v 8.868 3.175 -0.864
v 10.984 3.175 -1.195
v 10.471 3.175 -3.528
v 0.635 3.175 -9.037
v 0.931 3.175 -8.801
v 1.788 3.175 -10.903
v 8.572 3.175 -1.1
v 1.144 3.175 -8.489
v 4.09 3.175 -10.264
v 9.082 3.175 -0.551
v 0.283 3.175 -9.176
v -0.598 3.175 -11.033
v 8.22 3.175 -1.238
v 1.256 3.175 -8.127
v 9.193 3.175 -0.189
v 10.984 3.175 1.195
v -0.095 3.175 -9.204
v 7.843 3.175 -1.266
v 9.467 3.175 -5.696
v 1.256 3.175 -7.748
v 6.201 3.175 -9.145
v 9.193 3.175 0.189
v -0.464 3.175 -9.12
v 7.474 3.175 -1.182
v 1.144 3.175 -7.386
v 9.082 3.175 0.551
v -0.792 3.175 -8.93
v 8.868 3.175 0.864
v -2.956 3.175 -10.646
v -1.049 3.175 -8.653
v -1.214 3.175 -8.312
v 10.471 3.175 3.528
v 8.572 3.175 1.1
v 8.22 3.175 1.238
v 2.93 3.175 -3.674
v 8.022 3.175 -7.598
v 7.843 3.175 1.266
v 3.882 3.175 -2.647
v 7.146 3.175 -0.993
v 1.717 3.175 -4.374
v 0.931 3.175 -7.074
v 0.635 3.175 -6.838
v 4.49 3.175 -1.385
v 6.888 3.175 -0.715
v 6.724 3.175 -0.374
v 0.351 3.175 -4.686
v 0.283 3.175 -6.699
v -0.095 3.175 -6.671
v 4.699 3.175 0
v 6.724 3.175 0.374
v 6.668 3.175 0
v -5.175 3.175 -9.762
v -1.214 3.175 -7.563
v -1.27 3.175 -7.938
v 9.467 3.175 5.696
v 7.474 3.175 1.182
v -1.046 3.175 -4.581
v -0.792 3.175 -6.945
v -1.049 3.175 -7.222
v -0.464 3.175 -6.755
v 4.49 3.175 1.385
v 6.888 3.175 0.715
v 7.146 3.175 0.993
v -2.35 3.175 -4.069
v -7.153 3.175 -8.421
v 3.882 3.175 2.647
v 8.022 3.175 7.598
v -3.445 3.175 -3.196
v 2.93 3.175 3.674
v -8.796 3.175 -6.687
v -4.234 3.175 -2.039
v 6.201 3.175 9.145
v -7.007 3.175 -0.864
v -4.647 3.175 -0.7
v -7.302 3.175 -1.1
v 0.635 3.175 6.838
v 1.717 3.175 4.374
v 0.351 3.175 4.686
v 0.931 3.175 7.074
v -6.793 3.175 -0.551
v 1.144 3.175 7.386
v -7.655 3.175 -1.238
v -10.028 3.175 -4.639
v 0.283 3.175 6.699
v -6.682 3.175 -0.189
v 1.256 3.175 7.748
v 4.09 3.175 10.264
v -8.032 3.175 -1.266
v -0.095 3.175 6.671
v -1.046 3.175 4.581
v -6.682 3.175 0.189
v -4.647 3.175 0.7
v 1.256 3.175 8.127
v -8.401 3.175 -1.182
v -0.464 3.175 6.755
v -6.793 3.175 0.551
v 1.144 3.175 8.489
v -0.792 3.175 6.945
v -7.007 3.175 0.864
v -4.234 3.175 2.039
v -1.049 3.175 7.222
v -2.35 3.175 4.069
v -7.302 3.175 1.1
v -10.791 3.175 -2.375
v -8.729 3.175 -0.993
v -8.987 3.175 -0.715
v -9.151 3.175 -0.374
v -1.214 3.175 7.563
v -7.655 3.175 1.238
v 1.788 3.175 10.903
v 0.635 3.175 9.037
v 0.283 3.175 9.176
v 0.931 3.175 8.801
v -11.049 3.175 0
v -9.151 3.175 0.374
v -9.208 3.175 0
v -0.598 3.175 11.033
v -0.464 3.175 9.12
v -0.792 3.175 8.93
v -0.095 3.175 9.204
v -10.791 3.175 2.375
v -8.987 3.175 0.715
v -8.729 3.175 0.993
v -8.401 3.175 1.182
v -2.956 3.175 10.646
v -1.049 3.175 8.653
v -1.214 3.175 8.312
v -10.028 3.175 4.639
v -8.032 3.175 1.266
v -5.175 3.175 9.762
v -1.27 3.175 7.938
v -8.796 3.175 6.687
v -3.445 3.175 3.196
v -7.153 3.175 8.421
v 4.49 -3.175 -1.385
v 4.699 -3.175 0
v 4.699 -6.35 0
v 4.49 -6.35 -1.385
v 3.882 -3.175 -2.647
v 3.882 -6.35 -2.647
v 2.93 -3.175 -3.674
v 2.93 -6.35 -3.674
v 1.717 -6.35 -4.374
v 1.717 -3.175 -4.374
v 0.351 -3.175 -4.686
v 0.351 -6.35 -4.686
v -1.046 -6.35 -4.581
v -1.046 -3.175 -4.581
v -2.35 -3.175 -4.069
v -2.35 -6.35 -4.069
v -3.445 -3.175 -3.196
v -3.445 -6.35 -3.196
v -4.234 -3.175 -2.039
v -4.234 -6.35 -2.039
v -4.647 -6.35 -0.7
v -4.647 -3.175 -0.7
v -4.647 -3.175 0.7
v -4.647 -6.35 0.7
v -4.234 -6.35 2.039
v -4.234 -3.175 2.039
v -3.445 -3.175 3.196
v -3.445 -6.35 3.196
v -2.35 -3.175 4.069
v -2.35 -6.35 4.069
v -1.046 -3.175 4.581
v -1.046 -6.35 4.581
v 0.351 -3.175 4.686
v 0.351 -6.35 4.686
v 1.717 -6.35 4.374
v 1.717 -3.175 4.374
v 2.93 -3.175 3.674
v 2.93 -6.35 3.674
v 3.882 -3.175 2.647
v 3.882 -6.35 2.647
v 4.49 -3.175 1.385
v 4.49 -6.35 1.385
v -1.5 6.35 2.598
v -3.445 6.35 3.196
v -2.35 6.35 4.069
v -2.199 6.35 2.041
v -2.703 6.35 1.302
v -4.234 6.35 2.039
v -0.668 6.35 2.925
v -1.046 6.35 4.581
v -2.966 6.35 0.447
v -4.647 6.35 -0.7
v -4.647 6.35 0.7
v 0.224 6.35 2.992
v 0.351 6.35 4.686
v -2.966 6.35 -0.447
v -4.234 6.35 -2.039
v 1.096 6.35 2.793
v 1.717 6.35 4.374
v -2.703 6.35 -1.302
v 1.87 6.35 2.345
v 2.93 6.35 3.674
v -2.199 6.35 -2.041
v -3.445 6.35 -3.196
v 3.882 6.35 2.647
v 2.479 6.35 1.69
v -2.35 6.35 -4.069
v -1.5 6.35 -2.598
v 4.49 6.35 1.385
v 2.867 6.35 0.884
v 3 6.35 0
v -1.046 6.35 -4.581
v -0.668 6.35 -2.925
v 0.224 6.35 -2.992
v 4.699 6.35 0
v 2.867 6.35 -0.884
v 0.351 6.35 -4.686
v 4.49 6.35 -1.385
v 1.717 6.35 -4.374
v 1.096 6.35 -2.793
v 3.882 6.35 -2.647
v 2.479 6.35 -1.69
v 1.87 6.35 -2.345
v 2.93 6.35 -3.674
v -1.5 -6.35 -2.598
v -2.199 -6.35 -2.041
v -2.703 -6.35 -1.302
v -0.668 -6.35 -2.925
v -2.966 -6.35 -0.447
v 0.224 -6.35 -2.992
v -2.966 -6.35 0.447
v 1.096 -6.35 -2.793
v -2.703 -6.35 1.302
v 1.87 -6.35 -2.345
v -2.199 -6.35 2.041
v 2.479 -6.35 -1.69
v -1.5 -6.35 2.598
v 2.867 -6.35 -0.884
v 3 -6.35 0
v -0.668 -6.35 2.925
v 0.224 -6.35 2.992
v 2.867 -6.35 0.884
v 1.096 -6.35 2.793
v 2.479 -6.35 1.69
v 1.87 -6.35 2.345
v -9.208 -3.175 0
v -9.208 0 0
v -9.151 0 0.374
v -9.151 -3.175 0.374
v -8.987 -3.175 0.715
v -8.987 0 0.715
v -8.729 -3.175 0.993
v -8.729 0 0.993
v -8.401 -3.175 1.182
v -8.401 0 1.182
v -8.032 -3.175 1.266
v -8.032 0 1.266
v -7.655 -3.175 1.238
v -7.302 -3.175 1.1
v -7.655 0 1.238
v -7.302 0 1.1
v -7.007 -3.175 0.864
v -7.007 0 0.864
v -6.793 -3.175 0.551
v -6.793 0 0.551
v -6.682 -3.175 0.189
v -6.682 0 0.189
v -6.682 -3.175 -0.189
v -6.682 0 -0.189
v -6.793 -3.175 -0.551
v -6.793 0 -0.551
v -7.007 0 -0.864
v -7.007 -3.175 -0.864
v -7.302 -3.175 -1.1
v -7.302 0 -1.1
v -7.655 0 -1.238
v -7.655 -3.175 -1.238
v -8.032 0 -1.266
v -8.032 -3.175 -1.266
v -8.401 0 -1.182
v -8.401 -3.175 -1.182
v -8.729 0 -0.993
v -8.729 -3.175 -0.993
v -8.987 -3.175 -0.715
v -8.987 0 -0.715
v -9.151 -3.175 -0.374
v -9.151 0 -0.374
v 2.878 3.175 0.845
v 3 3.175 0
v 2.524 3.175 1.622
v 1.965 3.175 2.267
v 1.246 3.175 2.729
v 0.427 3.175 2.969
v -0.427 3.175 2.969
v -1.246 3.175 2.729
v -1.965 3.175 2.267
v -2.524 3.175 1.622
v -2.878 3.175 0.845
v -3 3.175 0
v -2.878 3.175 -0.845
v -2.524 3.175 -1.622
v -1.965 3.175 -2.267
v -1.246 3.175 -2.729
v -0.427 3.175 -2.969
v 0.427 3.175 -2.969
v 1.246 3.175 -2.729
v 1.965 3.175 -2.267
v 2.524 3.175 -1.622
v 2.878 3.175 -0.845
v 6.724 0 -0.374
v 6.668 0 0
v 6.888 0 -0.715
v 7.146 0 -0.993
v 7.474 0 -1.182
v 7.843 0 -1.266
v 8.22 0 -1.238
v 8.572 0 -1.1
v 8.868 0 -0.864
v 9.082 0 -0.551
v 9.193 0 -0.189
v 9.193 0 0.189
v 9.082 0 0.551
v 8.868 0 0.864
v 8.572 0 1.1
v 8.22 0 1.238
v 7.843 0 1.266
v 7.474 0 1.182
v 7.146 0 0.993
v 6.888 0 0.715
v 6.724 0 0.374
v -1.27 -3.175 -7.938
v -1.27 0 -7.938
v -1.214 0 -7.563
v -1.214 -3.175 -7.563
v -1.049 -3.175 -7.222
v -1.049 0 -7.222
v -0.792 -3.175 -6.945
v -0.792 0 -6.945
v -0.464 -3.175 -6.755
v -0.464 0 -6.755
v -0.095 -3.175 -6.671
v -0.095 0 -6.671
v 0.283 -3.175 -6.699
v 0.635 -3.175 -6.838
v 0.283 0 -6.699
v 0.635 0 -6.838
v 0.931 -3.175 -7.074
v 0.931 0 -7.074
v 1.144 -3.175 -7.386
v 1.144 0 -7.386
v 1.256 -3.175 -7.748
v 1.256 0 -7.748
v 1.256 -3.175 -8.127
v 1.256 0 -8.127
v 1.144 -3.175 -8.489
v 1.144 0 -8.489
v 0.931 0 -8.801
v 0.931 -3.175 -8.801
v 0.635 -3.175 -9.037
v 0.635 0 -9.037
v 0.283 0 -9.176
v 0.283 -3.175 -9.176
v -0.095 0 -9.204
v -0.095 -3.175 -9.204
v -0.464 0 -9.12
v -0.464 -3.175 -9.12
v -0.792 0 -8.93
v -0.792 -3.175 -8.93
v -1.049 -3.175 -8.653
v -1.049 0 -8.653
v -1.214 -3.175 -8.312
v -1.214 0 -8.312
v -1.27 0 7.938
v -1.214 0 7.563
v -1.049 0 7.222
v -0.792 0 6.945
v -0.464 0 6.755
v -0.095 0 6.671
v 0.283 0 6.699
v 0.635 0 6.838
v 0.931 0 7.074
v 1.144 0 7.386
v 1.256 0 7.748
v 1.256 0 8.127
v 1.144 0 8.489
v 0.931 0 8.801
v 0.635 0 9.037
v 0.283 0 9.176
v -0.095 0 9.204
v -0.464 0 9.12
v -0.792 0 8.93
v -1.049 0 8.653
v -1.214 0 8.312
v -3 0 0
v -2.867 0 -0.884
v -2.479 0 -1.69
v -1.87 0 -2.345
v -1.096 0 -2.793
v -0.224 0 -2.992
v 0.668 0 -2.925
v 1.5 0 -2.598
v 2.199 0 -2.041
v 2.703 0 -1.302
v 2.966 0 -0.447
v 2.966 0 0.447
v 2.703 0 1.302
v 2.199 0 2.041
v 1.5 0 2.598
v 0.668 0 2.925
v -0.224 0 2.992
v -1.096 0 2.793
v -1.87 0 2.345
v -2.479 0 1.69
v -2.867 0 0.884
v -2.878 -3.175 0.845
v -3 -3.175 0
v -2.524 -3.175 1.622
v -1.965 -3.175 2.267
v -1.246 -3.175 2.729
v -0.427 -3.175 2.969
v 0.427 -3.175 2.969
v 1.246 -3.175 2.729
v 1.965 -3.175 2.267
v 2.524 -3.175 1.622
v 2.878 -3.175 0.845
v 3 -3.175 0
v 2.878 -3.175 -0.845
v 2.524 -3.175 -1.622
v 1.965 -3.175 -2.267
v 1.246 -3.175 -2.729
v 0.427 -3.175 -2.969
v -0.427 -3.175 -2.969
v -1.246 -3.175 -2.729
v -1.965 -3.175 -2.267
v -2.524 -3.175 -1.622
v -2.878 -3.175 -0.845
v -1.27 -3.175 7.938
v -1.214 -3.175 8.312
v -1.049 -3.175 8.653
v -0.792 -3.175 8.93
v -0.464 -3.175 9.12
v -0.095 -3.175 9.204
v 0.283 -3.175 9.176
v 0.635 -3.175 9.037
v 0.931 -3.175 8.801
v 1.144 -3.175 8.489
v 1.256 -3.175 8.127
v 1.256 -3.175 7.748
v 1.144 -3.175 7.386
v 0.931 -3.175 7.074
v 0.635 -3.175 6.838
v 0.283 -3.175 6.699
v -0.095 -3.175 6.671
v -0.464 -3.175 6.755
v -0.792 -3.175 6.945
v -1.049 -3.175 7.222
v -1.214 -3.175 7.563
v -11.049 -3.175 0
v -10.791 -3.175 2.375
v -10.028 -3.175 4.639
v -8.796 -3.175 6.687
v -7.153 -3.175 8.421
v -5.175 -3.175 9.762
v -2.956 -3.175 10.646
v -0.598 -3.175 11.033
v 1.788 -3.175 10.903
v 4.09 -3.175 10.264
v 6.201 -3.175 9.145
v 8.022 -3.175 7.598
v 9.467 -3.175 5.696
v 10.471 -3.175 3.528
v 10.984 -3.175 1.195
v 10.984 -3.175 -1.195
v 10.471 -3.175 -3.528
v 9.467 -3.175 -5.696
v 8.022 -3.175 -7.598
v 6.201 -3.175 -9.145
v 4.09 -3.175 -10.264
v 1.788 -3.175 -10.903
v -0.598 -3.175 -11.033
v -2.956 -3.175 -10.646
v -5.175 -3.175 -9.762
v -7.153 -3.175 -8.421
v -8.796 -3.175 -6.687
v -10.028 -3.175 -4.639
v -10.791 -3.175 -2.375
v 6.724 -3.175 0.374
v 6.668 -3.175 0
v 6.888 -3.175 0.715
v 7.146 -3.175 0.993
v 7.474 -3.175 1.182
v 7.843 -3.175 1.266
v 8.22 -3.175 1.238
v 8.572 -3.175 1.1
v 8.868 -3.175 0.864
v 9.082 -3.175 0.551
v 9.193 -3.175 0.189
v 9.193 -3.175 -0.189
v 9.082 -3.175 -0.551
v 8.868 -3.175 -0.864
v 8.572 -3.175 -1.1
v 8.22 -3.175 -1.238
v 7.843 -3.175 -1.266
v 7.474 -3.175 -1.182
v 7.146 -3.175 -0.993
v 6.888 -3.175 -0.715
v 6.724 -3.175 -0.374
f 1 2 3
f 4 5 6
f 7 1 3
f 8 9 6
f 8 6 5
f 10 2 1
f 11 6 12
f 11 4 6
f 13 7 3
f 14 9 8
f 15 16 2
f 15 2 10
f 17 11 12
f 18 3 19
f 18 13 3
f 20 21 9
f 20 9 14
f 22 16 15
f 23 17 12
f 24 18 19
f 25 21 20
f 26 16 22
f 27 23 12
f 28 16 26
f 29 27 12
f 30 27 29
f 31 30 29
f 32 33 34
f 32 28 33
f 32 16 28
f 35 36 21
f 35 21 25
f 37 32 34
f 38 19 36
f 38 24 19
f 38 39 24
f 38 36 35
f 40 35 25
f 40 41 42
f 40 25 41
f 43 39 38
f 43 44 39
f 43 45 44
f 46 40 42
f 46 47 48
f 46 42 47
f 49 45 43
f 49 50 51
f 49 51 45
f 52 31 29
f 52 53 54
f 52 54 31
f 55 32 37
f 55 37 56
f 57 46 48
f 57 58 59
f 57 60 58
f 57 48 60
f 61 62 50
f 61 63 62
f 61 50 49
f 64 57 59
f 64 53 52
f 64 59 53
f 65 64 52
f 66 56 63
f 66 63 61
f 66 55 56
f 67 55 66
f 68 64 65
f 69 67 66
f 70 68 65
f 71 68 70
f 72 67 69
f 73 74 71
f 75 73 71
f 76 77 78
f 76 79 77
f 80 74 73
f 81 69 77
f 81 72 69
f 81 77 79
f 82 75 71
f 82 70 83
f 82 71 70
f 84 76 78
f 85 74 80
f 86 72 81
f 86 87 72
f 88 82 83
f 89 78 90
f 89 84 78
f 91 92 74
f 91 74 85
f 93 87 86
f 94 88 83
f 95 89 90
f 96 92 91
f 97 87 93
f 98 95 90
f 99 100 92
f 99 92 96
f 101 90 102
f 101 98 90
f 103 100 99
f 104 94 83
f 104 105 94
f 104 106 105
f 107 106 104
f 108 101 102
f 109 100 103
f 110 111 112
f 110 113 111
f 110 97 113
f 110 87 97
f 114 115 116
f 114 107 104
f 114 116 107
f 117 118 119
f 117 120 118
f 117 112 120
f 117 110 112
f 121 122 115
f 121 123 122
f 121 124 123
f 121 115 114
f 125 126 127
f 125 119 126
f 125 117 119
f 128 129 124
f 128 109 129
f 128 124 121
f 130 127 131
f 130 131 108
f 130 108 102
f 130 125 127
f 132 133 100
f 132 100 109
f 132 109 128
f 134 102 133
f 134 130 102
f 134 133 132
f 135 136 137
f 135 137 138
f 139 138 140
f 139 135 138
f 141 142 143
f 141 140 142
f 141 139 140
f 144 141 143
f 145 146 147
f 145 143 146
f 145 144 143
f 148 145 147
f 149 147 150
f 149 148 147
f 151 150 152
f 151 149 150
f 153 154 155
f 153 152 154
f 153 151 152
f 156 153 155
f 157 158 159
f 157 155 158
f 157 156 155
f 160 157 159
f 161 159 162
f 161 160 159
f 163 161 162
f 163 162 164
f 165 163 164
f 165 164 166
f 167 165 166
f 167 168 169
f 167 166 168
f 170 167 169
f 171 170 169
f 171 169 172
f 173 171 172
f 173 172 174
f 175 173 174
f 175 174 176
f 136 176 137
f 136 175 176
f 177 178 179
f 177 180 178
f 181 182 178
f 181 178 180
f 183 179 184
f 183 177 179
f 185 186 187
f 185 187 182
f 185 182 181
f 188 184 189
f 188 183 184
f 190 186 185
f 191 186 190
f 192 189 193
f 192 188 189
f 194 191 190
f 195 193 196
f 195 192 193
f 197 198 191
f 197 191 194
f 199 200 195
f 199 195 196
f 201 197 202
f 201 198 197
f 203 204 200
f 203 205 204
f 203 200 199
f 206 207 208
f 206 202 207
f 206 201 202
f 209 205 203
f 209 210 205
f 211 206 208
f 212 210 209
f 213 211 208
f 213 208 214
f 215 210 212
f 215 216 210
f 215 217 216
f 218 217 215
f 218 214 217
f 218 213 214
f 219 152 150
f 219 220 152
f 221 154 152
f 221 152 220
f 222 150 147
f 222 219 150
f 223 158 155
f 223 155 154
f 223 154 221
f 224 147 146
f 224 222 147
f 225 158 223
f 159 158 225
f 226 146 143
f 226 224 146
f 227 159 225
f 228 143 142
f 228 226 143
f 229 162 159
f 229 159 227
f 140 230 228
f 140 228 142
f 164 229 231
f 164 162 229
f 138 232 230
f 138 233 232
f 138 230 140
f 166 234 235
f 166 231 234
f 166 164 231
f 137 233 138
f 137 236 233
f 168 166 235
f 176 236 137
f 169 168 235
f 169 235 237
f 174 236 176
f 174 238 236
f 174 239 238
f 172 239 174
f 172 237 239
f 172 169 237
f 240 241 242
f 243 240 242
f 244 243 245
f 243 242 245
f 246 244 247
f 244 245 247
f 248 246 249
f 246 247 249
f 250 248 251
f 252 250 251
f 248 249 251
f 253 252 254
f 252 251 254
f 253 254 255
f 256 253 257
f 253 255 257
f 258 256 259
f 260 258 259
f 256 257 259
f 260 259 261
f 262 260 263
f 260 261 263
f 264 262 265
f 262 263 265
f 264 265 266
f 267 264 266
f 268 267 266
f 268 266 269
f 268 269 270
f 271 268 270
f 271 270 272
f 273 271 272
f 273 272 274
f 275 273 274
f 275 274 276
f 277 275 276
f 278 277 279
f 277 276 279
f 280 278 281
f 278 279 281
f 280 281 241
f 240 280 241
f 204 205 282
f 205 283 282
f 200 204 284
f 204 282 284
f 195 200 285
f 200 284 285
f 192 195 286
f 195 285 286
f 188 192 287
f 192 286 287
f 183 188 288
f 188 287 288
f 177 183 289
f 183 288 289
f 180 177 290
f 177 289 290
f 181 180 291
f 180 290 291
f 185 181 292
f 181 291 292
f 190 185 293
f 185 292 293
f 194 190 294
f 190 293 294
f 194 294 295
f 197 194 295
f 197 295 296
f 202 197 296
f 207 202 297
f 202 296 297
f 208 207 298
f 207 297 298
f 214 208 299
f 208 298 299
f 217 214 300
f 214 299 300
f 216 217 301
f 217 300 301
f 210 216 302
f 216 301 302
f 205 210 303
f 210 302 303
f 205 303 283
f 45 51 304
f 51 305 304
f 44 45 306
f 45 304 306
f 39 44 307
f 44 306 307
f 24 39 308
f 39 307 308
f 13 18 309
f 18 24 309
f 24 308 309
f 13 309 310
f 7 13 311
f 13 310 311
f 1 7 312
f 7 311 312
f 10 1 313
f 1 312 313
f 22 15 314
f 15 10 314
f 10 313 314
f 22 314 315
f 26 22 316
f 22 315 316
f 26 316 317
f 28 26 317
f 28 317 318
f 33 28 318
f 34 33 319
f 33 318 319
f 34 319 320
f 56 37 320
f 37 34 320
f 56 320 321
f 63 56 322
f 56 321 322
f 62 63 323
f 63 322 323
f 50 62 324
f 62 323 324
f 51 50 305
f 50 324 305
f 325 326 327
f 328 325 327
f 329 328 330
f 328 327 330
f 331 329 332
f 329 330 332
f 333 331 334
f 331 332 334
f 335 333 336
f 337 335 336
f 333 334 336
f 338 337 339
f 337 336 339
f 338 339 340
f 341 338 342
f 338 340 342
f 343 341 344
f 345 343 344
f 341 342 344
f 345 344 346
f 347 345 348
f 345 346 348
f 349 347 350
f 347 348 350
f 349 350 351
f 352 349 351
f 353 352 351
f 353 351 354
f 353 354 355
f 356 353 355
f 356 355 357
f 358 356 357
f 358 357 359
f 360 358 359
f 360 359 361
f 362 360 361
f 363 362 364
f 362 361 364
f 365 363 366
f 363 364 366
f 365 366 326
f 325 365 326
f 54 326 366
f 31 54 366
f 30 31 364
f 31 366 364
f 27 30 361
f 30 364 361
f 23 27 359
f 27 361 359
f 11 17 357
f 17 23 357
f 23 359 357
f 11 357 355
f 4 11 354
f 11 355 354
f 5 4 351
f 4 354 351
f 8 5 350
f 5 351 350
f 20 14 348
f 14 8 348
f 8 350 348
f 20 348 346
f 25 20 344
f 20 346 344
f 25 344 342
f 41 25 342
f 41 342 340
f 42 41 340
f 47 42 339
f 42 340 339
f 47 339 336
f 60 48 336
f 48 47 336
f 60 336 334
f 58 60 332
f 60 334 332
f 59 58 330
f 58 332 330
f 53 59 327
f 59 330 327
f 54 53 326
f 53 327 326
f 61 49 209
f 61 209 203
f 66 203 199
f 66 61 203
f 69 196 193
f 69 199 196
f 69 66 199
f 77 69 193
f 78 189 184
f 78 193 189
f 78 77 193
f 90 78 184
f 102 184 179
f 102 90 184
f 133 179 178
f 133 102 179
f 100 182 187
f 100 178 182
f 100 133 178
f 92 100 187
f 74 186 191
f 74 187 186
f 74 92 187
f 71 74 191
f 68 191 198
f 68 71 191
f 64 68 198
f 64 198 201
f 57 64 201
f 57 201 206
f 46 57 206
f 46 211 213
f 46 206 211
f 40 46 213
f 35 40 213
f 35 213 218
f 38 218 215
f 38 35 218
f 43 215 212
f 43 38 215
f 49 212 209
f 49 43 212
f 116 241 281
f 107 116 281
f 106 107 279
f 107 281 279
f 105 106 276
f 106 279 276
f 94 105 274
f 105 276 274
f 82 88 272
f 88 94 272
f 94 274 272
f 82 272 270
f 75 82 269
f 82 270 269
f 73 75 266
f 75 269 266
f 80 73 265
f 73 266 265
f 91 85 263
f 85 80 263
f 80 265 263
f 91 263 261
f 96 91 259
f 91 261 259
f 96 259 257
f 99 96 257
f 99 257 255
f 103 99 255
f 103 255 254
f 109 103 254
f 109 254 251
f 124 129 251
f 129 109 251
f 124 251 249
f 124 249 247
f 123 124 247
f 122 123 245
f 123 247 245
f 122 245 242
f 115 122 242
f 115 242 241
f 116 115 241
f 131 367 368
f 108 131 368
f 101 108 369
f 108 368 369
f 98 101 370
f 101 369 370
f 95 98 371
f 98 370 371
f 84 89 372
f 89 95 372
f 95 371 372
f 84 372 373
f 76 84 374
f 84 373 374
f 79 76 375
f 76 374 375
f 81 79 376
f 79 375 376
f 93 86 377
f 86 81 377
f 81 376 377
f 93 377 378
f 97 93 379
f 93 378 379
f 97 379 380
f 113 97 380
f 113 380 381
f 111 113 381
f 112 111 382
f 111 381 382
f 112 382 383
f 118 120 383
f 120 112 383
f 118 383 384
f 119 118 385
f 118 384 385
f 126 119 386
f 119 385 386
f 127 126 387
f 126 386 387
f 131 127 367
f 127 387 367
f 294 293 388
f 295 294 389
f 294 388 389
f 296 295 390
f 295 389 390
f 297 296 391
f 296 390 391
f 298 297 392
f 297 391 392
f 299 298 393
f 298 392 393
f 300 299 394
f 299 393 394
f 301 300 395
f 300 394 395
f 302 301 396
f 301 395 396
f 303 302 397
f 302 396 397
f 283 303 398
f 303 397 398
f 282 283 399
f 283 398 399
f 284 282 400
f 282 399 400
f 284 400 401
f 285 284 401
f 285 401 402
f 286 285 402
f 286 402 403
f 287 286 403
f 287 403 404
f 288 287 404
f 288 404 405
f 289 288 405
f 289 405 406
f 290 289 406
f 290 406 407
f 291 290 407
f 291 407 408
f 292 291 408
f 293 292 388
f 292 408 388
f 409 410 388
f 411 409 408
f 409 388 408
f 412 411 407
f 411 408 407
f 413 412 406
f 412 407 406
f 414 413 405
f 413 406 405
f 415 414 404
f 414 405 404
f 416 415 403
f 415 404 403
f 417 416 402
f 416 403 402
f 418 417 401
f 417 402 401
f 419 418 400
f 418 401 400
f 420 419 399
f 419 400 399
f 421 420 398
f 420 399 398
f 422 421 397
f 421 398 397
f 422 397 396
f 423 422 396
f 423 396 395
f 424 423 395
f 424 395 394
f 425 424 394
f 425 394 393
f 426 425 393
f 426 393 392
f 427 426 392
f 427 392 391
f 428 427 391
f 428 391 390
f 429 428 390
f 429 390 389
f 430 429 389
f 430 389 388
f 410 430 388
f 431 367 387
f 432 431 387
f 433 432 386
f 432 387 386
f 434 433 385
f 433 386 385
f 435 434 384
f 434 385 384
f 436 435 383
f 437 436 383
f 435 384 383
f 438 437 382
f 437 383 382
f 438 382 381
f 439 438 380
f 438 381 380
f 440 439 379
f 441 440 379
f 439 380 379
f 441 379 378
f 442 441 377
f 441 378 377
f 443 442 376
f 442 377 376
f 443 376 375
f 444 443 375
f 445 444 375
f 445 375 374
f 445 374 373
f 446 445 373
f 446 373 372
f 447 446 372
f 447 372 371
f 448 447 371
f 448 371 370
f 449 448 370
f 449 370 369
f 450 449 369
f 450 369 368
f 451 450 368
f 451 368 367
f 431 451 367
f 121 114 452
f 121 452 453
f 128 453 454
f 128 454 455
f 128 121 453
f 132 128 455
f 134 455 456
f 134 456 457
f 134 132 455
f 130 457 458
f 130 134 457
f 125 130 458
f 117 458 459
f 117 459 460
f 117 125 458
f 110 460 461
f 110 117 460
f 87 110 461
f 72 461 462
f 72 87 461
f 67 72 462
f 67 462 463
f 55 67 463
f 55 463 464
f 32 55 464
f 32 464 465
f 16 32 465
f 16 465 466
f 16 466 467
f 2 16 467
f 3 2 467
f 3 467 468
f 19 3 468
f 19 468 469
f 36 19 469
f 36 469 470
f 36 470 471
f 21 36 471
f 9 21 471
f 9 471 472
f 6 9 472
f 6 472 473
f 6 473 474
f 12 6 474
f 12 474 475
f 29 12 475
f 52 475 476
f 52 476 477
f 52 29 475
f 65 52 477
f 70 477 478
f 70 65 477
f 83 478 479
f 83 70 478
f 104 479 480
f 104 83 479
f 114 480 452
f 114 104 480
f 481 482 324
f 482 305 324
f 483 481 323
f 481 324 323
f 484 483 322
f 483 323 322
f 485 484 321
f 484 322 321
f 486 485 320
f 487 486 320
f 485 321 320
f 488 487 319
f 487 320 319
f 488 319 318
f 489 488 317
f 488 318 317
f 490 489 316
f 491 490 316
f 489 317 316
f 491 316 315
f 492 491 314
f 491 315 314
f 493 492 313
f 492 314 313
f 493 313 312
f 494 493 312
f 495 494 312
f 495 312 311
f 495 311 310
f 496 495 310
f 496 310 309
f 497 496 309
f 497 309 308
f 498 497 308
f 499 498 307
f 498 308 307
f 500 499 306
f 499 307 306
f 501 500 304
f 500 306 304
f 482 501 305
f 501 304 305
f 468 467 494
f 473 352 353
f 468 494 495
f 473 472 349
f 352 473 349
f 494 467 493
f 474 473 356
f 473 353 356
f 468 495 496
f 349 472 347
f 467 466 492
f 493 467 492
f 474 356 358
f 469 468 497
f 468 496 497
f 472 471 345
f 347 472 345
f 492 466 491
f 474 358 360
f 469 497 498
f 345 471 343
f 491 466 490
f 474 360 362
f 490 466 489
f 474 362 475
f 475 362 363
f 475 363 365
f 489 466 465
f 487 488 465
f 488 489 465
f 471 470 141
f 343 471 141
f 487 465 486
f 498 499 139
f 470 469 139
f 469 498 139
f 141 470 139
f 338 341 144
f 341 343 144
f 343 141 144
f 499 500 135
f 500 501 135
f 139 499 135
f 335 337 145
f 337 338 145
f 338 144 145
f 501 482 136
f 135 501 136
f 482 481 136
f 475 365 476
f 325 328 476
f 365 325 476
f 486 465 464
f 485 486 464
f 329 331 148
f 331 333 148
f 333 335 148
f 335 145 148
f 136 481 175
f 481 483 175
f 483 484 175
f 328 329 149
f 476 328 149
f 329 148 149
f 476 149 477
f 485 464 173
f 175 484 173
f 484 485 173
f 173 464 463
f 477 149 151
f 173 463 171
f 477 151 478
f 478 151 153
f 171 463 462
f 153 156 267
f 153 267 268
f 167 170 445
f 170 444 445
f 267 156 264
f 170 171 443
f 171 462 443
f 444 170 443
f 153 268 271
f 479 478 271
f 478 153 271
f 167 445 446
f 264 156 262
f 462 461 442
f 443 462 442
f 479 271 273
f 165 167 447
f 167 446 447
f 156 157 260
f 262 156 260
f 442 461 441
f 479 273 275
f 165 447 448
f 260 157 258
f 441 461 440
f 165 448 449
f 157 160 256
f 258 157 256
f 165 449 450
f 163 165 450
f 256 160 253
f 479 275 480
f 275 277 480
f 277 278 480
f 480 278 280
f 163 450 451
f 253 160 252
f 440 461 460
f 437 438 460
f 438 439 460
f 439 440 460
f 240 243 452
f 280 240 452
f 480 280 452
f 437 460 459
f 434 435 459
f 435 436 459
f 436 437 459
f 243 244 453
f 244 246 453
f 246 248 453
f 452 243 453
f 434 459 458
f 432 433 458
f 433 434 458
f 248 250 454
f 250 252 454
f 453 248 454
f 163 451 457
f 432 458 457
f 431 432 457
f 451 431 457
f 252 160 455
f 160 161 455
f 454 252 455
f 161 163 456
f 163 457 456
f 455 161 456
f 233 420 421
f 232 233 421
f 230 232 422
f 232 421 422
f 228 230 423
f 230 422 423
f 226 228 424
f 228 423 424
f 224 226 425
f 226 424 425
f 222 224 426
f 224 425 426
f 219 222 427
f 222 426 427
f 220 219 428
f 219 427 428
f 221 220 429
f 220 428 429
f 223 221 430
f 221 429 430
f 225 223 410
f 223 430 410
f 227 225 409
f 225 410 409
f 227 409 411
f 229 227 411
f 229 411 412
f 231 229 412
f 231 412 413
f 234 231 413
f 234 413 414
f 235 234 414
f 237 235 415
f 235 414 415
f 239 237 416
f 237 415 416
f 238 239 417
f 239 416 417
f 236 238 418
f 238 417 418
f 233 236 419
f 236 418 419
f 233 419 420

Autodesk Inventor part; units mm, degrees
ref_plane "YZ Plane" through (0, 0, 0) normal (1, 0, 0) x (0, 1, 0)
ref_plane "XZ Plane" through (0, 0, 0) normal (0, 1, 0) x (-1, 0, 0)
ref_plane "XY Plane" through (0, 0, 0) normal (0, 0, 1) x (1, 0, 0)
sketch "Sketch1" plane through (0, 0, 0) normal (0, 1, 0) x (-1, 0, 0)
  circle A0 centre (0, 0) radius 3
  circle A1 centre (0, 0) radius 11.049
  circle A2 centre (0, -7.9375) radius 1.27
  circle A3 centre (7.9375, 0) radius 1.27
  circle A4 centre (0, 7.9375) radius 1.27
  circle A5 centre (-7.9375, 0) radius 1.27
  dimension "d4" = 6
  dimension "d6" = 22.098
  dimension "d10" = 2.54
  dimension "d11" = 7.9375
  dimension "d14" = 360
extrude "Extrusion1" add sketch "Sketch1" along normal mid plane 6.35
sketch "Sketch2" plane through (0, 3.175, 0) normal (0, 1, 0) x (1, 0, 0)
  circle A0 centre (0, 0) radius 3
  circle A1 centre (0, 0) radius 4.699
  dimension "d18" = 6
  dimension "d19" = 9.398
extrude "Extrusion2" add sketch "Sketch2" along normal blind 3.175
sketch "Sketch3" plane through (0, -3.175, 0) normal (0, -1, 0) x (1, 0, 0)
  circle A0 centre (0, 0) radius 3
  circle A1 centre (0, 0) radius 4.699
  dimension "d22" = 6
  dimension "d23" = 9.398
extrude "Extrusion3" add sketch "Sketch3" along normal blind 3.175
properties part number "CouplingScrew"
